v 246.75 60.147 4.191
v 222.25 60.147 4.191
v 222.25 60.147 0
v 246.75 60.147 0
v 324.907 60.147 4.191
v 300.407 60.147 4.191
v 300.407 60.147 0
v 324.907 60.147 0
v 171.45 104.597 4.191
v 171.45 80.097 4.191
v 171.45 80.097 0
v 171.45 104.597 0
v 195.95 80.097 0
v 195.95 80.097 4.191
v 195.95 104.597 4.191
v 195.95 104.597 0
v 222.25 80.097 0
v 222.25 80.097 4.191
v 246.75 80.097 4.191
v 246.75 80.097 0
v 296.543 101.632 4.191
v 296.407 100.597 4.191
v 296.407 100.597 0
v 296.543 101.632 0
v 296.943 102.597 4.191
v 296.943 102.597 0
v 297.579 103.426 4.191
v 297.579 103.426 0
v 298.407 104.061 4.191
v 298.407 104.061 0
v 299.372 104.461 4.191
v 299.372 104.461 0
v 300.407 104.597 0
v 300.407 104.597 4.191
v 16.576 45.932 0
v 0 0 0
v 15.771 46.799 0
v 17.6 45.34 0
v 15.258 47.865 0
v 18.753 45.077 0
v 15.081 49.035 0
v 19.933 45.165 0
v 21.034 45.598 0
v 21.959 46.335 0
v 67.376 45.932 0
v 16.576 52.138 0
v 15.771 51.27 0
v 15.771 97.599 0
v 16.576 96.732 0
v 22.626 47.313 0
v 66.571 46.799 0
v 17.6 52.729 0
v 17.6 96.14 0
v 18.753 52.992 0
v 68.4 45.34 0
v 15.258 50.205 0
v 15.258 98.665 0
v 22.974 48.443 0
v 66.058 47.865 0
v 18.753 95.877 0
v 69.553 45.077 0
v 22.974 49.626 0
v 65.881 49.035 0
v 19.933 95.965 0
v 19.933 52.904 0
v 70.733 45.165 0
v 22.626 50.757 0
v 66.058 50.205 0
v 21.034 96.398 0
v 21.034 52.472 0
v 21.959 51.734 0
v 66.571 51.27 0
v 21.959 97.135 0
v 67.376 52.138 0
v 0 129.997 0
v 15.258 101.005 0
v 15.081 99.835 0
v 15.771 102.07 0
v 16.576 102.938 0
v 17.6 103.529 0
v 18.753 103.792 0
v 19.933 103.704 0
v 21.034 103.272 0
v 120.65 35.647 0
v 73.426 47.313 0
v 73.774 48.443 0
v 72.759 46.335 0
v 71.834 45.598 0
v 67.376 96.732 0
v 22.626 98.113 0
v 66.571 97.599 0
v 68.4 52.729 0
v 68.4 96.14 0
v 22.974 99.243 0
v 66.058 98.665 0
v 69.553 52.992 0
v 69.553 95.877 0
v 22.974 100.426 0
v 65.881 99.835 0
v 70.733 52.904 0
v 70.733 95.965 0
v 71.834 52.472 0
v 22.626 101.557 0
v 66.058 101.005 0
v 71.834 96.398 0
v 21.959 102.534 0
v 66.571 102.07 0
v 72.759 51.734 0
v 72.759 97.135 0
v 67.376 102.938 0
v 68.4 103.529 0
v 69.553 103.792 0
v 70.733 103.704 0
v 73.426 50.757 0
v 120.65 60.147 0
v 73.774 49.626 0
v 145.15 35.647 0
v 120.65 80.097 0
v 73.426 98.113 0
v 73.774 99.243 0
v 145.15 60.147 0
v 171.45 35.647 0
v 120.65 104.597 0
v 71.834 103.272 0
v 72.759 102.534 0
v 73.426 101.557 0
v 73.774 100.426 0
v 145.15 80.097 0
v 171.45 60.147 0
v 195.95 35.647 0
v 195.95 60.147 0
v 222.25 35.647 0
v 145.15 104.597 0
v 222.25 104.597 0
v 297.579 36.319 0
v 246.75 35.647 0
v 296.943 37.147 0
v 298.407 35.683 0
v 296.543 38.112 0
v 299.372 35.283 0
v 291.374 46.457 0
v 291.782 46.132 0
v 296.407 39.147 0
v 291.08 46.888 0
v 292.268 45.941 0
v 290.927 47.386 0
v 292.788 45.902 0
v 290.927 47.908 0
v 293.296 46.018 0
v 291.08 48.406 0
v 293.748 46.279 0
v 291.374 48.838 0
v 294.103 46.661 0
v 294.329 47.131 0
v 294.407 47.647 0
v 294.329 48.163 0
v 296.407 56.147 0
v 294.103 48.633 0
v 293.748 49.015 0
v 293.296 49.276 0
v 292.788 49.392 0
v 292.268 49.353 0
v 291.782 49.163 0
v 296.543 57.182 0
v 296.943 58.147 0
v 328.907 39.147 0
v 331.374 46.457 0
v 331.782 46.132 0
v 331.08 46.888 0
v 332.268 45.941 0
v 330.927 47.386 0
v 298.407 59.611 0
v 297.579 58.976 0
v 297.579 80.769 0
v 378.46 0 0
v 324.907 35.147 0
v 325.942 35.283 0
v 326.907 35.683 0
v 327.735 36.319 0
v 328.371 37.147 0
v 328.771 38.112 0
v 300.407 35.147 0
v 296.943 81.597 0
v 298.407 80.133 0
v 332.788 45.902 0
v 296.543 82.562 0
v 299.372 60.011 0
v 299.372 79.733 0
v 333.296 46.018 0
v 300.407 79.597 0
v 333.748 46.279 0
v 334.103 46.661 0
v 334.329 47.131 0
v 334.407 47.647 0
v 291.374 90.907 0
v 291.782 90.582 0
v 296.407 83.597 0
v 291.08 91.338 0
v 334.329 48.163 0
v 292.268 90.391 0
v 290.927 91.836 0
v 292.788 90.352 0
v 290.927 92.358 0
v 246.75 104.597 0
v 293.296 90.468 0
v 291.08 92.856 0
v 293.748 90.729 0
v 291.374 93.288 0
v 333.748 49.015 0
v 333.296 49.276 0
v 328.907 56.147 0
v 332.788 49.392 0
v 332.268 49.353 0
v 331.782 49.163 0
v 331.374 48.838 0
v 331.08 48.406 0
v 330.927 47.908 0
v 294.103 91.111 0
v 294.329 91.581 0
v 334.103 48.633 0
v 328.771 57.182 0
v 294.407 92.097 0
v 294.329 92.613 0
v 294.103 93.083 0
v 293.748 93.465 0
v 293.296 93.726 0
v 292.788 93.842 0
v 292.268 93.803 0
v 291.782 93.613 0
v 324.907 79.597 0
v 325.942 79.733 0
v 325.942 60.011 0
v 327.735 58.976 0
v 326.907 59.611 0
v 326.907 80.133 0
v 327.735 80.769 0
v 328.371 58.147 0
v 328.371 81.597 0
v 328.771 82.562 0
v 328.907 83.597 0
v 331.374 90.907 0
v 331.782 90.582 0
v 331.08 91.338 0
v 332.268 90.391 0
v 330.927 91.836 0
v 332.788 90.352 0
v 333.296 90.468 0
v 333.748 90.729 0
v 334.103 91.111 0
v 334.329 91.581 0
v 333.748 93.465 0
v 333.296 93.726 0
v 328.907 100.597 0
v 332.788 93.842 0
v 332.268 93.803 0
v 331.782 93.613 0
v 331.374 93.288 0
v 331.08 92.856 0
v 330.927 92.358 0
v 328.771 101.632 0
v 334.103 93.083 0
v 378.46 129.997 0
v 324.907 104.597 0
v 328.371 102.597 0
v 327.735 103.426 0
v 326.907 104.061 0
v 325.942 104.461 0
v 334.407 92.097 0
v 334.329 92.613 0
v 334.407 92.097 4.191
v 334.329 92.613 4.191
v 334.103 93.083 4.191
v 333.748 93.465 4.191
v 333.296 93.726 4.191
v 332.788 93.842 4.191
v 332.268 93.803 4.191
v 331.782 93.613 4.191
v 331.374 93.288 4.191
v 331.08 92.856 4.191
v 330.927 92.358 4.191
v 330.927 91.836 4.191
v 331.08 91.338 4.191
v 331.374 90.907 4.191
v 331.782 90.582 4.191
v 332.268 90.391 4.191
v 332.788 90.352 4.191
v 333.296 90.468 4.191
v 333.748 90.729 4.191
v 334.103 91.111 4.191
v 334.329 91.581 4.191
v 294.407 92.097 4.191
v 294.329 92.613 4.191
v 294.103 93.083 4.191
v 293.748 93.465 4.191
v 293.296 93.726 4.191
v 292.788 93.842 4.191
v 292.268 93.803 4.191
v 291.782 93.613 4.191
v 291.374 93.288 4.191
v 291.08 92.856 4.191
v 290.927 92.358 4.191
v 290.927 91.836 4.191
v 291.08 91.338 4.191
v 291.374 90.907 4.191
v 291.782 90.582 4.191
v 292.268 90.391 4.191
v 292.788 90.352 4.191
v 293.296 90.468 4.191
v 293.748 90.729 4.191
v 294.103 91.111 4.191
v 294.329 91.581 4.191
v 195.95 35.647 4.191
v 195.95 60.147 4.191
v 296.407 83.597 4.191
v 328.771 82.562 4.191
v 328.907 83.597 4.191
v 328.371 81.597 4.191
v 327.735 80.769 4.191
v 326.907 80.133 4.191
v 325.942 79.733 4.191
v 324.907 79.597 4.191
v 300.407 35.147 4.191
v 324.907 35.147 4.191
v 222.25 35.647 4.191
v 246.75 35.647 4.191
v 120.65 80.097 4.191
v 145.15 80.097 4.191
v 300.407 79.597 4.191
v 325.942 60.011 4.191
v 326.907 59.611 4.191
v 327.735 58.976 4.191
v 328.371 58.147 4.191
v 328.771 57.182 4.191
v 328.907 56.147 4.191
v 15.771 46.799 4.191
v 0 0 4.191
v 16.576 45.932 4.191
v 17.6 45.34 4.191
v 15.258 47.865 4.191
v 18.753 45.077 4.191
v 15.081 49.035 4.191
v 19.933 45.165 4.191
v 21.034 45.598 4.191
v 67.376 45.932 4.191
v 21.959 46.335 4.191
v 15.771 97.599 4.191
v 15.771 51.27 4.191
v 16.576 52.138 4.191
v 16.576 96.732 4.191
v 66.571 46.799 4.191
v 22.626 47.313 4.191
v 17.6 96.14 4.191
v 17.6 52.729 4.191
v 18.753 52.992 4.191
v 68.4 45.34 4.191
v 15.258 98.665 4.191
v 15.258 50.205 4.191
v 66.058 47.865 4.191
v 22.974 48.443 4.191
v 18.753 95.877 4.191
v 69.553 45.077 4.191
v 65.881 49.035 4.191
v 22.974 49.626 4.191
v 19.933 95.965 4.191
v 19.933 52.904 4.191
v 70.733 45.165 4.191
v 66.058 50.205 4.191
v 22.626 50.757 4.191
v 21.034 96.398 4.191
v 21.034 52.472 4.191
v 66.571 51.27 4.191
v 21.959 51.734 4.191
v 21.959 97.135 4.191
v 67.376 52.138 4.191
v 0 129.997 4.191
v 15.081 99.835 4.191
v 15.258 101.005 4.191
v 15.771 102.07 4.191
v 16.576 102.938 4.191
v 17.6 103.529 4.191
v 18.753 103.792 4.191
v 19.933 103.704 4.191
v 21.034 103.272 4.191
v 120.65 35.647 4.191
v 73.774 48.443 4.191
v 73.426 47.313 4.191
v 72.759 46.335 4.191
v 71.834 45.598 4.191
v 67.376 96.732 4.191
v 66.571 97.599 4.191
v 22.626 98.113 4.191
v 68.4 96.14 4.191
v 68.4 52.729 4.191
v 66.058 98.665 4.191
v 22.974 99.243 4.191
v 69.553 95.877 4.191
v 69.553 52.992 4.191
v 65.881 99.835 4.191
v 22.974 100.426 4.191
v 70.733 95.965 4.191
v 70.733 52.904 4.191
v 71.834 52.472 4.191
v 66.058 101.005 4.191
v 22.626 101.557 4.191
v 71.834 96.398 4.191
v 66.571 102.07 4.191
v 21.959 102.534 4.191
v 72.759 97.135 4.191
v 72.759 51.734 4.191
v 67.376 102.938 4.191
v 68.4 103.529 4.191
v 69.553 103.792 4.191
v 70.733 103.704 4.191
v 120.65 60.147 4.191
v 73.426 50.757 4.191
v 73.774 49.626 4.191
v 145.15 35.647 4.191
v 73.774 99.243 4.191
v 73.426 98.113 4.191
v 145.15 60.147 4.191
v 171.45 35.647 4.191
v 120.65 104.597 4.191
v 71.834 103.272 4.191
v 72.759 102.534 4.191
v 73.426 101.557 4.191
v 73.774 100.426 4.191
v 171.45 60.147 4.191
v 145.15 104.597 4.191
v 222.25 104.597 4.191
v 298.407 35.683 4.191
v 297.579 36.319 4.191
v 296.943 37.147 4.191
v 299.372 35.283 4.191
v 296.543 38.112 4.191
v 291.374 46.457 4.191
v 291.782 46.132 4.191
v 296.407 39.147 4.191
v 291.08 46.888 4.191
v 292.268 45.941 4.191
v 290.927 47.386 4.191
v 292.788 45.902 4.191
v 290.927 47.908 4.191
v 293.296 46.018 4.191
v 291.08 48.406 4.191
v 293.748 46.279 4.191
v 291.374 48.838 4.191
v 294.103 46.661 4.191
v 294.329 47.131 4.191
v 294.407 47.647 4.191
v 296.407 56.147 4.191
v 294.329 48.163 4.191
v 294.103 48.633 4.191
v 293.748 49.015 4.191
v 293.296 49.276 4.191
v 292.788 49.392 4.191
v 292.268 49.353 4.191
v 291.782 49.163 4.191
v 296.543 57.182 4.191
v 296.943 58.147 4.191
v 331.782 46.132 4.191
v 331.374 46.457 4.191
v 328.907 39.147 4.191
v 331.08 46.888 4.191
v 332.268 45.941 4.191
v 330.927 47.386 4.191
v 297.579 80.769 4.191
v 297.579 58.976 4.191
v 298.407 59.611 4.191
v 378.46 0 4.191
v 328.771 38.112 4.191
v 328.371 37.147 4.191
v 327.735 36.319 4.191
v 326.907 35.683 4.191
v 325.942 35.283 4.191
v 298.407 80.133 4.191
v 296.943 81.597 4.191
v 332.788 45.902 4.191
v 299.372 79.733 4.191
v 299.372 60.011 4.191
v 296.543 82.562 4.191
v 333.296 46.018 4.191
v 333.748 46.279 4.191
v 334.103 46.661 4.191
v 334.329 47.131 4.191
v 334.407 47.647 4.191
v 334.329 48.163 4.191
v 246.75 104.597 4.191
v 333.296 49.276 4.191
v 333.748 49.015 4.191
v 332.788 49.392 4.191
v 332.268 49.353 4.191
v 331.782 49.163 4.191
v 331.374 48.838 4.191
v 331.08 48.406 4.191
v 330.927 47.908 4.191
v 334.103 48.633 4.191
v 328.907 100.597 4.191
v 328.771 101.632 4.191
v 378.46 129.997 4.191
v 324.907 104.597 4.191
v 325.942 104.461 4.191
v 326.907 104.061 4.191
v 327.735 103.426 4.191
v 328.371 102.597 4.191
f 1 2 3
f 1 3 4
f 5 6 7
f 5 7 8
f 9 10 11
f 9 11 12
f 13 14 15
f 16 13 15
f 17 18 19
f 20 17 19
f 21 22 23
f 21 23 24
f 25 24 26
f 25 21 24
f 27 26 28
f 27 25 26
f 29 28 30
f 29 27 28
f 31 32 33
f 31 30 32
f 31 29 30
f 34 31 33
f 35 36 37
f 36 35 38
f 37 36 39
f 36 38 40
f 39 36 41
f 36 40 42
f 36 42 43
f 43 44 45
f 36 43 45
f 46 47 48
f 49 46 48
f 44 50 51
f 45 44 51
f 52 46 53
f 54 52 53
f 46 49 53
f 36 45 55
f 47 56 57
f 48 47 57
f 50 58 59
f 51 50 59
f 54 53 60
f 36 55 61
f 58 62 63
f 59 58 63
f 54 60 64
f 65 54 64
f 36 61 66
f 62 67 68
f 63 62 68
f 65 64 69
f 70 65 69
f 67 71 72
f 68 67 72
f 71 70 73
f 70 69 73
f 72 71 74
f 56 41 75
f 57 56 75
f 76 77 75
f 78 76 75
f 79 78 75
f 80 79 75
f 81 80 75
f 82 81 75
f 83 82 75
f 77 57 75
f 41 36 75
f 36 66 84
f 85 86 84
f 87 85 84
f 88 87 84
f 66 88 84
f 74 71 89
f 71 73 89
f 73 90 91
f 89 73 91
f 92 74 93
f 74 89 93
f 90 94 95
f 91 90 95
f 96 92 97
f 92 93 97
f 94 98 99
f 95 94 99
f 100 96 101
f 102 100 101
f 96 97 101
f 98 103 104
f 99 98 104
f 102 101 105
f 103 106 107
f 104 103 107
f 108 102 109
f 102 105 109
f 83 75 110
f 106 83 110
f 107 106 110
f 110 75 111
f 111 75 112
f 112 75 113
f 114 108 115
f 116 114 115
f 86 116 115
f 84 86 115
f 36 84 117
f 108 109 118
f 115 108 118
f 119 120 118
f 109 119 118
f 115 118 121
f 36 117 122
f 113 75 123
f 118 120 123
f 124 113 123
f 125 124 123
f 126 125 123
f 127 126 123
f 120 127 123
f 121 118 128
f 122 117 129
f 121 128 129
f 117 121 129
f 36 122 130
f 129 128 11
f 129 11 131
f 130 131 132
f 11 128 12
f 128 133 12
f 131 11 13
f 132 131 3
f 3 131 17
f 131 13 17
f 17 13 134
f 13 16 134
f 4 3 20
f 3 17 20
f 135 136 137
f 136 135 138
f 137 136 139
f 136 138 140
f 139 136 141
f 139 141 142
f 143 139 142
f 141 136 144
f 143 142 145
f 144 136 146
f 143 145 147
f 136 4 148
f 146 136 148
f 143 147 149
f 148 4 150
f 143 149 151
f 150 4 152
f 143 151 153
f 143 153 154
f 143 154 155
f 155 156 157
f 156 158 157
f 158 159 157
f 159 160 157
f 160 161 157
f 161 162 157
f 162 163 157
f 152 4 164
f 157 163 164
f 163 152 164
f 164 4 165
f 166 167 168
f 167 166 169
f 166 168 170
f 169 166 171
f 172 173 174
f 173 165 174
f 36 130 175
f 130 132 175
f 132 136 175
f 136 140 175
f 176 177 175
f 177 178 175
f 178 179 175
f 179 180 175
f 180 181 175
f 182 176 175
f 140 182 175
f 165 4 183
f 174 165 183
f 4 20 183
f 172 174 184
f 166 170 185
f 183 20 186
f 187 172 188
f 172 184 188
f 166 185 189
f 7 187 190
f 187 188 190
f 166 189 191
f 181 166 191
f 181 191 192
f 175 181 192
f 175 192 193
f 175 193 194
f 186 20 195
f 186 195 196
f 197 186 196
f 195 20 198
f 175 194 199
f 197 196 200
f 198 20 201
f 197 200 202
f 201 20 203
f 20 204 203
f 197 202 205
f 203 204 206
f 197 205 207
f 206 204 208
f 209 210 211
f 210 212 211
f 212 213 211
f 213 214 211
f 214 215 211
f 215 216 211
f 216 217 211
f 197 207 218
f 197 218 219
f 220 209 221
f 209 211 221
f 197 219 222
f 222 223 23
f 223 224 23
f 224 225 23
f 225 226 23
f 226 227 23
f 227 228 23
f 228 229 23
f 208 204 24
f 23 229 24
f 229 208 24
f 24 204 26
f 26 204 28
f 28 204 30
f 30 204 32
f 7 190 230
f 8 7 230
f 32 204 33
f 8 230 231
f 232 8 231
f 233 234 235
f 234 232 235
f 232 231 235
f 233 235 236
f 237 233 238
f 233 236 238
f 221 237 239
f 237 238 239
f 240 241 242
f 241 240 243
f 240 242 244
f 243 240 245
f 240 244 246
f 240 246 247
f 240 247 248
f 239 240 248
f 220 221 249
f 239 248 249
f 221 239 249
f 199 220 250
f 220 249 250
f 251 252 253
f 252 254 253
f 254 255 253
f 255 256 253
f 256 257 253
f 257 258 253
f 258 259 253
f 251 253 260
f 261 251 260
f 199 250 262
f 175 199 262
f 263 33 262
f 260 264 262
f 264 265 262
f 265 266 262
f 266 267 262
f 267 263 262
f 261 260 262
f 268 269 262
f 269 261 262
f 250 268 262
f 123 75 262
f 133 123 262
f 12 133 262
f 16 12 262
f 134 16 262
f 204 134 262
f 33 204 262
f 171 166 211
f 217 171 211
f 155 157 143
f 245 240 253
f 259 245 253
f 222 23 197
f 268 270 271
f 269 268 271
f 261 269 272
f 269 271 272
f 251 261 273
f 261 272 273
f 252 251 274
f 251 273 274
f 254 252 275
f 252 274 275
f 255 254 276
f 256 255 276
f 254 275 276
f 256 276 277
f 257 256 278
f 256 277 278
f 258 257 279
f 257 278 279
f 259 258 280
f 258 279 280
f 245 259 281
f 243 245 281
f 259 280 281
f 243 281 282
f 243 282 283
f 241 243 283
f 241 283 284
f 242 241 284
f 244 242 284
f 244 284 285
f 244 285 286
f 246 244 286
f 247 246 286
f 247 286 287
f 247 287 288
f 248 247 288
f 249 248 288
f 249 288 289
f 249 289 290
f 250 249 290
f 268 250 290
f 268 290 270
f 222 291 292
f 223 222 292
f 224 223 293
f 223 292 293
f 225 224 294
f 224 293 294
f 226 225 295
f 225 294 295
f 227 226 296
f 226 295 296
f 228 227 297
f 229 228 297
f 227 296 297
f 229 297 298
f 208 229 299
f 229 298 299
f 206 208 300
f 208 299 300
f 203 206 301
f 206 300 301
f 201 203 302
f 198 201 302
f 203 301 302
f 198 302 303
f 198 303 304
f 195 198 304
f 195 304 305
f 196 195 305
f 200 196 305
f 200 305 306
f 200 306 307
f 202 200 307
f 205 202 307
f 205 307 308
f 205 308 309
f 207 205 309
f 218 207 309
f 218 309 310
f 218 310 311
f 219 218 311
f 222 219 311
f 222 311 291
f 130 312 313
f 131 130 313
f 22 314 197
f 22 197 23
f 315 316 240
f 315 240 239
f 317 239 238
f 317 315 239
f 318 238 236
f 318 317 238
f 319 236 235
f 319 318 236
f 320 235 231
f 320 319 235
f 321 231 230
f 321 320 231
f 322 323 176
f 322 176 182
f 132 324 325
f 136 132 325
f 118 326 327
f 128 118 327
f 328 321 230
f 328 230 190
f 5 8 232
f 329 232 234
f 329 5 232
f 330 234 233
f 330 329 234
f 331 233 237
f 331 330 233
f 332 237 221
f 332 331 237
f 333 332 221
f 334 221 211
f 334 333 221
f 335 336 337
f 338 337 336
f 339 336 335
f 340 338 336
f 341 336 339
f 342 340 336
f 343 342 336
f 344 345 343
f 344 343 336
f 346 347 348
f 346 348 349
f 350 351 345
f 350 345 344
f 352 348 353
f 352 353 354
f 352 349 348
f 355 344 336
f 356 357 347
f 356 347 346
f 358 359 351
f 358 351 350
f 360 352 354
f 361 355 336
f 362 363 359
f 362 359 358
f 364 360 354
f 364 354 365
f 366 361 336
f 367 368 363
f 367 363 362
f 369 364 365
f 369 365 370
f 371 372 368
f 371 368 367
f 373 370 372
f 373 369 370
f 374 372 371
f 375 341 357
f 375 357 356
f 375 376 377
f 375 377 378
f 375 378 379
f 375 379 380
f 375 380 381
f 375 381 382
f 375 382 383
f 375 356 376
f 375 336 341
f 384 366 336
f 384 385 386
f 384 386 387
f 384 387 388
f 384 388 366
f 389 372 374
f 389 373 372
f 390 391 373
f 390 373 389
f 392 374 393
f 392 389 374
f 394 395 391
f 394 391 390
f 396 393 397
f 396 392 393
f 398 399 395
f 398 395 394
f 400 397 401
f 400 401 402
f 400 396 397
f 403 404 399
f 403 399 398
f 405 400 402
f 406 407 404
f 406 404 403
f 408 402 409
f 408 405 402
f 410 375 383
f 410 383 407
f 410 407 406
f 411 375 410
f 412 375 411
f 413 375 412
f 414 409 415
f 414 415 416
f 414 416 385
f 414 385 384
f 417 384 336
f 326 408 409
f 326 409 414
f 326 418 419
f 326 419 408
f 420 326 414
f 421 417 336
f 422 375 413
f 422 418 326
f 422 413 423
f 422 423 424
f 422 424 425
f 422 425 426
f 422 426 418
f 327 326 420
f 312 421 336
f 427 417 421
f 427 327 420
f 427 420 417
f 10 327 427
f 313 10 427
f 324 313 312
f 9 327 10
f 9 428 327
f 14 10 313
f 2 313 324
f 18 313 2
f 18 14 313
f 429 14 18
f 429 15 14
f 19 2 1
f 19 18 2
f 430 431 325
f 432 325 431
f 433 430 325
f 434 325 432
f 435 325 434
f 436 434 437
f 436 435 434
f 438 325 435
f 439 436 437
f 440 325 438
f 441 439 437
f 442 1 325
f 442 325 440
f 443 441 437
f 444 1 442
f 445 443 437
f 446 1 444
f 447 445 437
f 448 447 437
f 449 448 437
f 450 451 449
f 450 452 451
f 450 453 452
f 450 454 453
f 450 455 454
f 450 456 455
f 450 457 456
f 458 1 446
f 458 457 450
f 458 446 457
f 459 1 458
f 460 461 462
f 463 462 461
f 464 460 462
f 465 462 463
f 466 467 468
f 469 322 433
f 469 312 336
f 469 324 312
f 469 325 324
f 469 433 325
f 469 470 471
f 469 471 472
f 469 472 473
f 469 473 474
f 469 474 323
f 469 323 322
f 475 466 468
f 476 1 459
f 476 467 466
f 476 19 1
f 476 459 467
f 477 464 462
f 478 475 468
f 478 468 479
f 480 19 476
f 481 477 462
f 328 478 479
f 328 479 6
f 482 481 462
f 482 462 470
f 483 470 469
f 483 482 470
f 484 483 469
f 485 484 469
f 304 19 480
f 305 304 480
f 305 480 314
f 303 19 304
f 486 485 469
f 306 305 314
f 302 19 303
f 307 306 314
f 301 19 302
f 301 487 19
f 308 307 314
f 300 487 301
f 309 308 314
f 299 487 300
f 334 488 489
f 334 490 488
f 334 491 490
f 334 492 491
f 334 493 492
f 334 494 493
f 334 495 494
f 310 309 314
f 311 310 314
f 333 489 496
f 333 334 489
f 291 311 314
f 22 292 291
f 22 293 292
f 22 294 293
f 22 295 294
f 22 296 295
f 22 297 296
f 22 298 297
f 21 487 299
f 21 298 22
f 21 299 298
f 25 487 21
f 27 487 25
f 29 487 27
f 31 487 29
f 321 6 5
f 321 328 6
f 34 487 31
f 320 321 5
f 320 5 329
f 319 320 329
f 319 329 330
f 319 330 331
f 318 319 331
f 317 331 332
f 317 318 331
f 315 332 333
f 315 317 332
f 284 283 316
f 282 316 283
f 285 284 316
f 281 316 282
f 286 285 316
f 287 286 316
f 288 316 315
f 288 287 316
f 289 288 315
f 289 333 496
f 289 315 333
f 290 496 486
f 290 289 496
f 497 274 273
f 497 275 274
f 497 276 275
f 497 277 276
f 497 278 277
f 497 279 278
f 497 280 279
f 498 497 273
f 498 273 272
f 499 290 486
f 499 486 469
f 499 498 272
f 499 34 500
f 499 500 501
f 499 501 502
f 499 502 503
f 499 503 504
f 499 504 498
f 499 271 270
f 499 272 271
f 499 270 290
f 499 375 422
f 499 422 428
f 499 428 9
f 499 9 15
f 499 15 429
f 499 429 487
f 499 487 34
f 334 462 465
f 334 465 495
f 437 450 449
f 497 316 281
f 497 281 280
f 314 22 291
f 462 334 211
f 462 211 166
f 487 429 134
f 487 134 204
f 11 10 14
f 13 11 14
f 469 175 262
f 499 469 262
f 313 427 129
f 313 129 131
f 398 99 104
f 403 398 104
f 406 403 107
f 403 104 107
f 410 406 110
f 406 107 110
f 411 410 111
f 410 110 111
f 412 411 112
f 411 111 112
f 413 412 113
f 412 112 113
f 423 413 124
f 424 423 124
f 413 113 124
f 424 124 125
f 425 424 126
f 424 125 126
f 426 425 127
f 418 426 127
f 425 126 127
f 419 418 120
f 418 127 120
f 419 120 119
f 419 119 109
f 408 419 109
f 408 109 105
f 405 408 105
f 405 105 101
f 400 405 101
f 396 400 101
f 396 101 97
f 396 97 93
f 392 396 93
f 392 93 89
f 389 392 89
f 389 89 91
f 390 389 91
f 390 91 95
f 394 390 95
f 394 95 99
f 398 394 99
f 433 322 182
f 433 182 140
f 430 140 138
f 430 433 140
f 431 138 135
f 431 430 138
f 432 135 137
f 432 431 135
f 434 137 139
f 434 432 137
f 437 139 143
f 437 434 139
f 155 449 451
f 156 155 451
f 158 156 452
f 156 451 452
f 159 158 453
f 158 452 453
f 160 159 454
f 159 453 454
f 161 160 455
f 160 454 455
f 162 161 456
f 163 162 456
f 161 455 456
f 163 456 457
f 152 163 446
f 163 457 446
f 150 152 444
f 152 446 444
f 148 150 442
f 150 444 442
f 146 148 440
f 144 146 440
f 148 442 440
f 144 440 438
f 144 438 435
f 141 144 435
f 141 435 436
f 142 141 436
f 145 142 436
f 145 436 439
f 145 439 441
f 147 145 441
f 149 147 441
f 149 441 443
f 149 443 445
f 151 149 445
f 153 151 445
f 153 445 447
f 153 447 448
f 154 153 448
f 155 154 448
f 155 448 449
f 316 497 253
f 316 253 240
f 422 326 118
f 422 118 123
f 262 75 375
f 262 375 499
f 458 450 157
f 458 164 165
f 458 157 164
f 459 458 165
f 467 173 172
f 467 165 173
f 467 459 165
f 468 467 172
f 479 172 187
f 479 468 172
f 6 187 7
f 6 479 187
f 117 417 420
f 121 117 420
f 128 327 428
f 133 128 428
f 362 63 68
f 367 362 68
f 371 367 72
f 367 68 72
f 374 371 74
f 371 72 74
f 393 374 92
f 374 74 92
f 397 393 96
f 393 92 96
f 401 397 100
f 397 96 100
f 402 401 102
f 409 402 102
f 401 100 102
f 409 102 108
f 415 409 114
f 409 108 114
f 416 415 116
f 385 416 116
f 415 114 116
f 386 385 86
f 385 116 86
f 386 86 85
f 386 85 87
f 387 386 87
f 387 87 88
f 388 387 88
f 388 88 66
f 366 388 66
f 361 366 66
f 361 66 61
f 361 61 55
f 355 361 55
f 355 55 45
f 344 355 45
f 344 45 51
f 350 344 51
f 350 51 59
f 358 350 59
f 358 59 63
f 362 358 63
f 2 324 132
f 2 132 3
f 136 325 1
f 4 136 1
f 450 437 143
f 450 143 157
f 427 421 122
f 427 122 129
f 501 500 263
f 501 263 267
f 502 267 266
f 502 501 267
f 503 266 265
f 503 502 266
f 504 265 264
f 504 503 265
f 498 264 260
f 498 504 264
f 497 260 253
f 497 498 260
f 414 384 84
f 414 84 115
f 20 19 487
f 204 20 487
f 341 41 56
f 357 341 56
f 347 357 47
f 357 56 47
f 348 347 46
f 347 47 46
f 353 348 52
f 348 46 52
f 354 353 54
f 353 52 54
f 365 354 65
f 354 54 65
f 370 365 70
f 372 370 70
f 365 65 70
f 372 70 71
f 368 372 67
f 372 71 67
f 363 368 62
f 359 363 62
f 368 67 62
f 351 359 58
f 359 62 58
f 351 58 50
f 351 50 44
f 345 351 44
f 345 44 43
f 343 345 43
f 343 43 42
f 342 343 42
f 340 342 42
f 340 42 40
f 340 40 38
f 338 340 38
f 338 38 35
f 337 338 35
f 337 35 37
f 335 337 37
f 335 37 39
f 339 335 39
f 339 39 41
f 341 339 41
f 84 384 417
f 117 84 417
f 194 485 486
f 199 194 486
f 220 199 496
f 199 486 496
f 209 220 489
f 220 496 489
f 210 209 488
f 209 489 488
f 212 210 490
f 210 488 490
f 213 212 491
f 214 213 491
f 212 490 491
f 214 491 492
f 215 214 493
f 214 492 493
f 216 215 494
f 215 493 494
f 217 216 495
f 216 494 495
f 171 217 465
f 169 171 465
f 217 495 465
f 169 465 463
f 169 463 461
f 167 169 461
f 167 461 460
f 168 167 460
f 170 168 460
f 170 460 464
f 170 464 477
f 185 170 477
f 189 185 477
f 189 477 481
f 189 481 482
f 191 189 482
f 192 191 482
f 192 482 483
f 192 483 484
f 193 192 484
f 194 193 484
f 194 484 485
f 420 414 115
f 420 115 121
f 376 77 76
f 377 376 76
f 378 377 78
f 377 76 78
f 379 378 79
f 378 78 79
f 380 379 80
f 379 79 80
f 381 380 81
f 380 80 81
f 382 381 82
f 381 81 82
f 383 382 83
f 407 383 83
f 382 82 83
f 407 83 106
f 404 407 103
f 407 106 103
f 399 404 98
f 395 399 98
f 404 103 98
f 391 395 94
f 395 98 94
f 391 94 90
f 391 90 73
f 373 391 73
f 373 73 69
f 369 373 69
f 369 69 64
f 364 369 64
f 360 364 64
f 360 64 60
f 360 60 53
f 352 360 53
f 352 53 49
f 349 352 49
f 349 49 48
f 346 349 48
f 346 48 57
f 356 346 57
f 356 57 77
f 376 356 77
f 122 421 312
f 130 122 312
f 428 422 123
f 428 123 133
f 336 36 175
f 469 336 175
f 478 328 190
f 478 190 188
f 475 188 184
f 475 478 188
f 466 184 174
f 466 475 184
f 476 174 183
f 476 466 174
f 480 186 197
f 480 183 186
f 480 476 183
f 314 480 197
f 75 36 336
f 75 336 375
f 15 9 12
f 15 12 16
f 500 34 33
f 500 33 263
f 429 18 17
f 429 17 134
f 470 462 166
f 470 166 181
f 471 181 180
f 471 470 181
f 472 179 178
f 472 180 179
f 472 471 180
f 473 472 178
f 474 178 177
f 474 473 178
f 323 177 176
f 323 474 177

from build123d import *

# Parameters (mm, degrees)
SKETCH1_W               = 378.46
SKETCH1_H               = 129.9972
BOSS_EXTRUDE1_DEPTH     = 4.191
F_3_8_16_TAPPED_HOLE1_D = 7.9375
CUT_EXTRUDE1_REACH      = 402.186
SKETCH5_W               = 24.5
SKETCH5_H               = 24.5
CUT_EXTRUDE2_REACH      = 402.186
SKETCH7_R               = 1.75


with BuildPart() as part:
    # Sketch1 → Boss-Extrude1 (new body)
    with BuildSketch(Plane.XY):
        with Locations((189.23, 64.9986)):
            Rectangle(SKETCH1_W, SKETCH1_H)
    extrude(amount=BOSS_EXTRUDE1_DEPTH)

    # 3/8-16 Tapped Hole1 (through all)
    with Locations(Plane.XY.offset(4.191)):
        with Locations((19.05, 99.8347), (69.85, 99.8347), (69.85, 49.0347), (19.05, 49.0347)):
            Hole(F_3_8_16_TAPPED_HOLE1_D / 2)

    # Sketch5 → Cut-Extrude1 (cut, up to next)
    with BuildSketch(Plane.XY.offset(4.191), mode=Mode.PRIVATE) as cut_extrude1_sk1:
        with Locations((132.9, 92.3472)):
            Rectangle(SKETCH5_W, SKETCH5_H)
    cut_extrude1_tool1 = extrude(cut_extrude1_sk1.sketch, amount=-CUT_EXTRUDE1_REACH, mode=Mode.PRIVATE) & part.part
    # Sketch5 → Cut-Extrude1 (cut, up to next)
    with BuildSketch(Plane.XY.offset(4.191), mode=Mode.PRIVATE) as cut_extrude1_sk2:
        with Locations((183.7, 92.3472)):
            Rectangle(SKETCH5_W, SKETCH5_H)
    cut_extrude1_tool2 = extrude(cut_extrude1_sk2.sketch, amount=-CUT_EXTRUDE1_REACH, mode=Mode.PRIVATE) & part.part
    # Sketch5 → Cut-Extrude1 (cut, up to next)
    with BuildSketch(Plane.XY.offset(4.191), mode=Mode.PRIVATE) as cut_extrude1_sk3:
        with Locations((234.5, 92.3472)):
            Rectangle(SKETCH5_W, SKETCH5_H)
    cut_extrude1_tool3 = extrude(cut_extrude1_sk3.sketch, amount=-CUT_EXTRUDE1_REACH, mode=Mode.PRIVATE) & part.part
    # Sketch5 → Cut-Extrude1 (cut, up to next)
    with BuildSketch(Plane.XY.offset(4.191), mode=Mode.PRIVATE) as cut_extrude1_sk4:
        with Locations((183.7, 47.8972)):
            Rectangle(SKETCH5_W, SKETCH5_H)
    cut_extrude1_tool4 = extrude(cut_extrude1_sk4.sketch, amount=-CUT_EXTRUDE1_REACH, mode=Mode.PRIVATE) & part.part
    # Sketch5 → Cut-Extrude1 (cut, up to next)
    with BuildSketch(Plane.XY.offset(4.191), mode=Mode.PRIVATE) as cut_extrude1_sk5:
        with Locations((234.5, 47.8972)):
            Rectangle(SKETCH5_W, SKETCH5_H)
    cut_extrude1_tool5 = extrude(cut_extrude1_sk5.sketch, amount=-CUT_EXTRUDE1_REACH, mode=Mode.PRIVATE) & part.part
    # Sketch5 → Cut-Extrude1 (cut, up to next)
    with BuildSketch(Plane.XY.offset(4.191), mode=Mode.PRIVATE) as cut_extrude1_sk6:
        with Locations((132.9, 47.8972)):
            Rectangle(SKETCH5_W, SKETCH5_H)
    cut_extrude1_tool6 = extrude(cut_extrude1_sk6.sketch, amount=-CUT_EXTRUDE1_REACH, mode=Mode.PRIVATE) & part.part
    add(cut_extrude1_tool1.solids().sort_by_distance((132.9, 92.3472, 4.191))[0], mode=Mode.SUBTRACT)
    add(cut_extrude1_tool2.solids().sort_by_distance((183.7, 92.3472, 4.191))[0], mode=Mode.SUBTRACT)
    add(cut_extrude1_tool3.solids().sort_by_distance((234.5, 92.3472, 4.191))[0], mode=Mode.SUBTRACT)
    add(cut_extrude1_tool4.solids().sort_by_distance((183.7, 47.8972, 4.191))[0], mode=Mode.SUBTRACT)
    add(cut_extrude1_tool5.solids().sort_by_distance((234.5, 47.8972, 4.191))[0], mode=Mode.SUBTRACT)
    add(cut_extrude1_tool6.solids().sort_by_distance((132.9, 47.8972, 4.191))[0], mode=Mode.SUBTRACT)

    # Sketch7 → Cut-Extrude2 (cut, up to next)
    with BuildSketch(Plane.XY.offset(4.191), mode=Mode.PRIVATE) as cut_extrude2_sk1:
        with Locations((292.657, 92.0972)):
            Circle(SKETCH7_R)
    cut_extrude2_tool1 = extrude(cut_extrude2_sk1.sketch, amount=-CUT_EXTRUDE2_REACH, mode=Mode.PRIVATE) & part.part
    # Sketch7 → Cut-Extrude2 (cut, up to next)
    with BuildSketch(Plane.XY.offset(4.191), mode=Mode.PRIVATE) as cut_extrude2_sk2:
        with Locations((332.657, 92.0972)):
            Circle(SKETCH7_R)
    cut_extrude2_tool2 = extrude(cut_extrude2_sk2.sketch, amount=-CUT_EXTRUDE2_REACH, mode=Mode.PRIVATE) & part.part
    # Sketch7 → Cut-Extrude2 (cut, up to next)
    with BuildSketch(Plane.XY.offset(4.191), mode=Mode.PRIVATE) as cut_extrude2_sk3:
        with Locations((332.657, 47.6472)):
            Circle(SKETCH7_R)
    cut_extrude2_tool3 = extrude(cut_extrude2_sk3.sketch, amount=-CUT_EXTRUDE2_REACH, mode=Mode.PRIVATE) & part.part
    # Sketch7 → Cut-Extrude2 (cut, up to next)
    with BuildSketch(Plane.XY.offset(4.191), mode=Mode.PRIVATE) as cut_extrude2_sk4:
        with Locations((292.657, 47.6472)):
            Circle(SKETCH7_R)
    cut_extrude2_tool4 = extrude(cut_extrude2_sk4.sketch, amount=-CUT_EXTRUDE2_REACH, mode=Mode.PRIVATE) & part.part
    # Sketch7 → Cut-Extrude2 (cut, up to next)
    with BuildSketch(Plane.XY.offset(4.191), mode=Mode.PRIVATE) as cut_extrude2_sk5:
        with BuildLine():
            Line((300.407, 60.1472), (324.907, 60.1472))
            ThreePointArc((324.907, 60.1472), (327.735427125, 58.975627125), (328.907, 56.1472))
            Line((328.907, 56.1472), (328.907, 39.1472))
            ThreePointArc((328.907, 39.1472), (327.735427125, 36.318772875), (324.907, 35.1472))
            Line((324.907, 35.1472), (300.407, 35.1472))
            ThreePointArc((300.407, 35.1472), (297.578572875, 36.318772875), (296.407, 39.1472))
            Line((296.407, 39.1472), (296.407, 56.1472))
            ThreePointArc((296.407, 56.1472), (297.578572875, 58.975627125), (300.407, 60.1472))
        make_face()
    cut_extrude2_tool5 = extrude(cut_extrude2_sk5.sketch, amount=-CUT_EXTRUDE2_REACH, mode=Mode.PRIVATE) & part.part
    # Sketch7 → Cut-Extrude2 (cut, up to next)
    with BuildSketch(Plane.XY.offset(4.191), mode=Mode.PRIVATE) as cut_extrude2_sk6:
        with BuildLine():
            Line((300.407, 104.5972), (324.907, 104.5972))
            ThreePointArc((324.907, 104.5972), (327.735427125, 103.425627125), (328.907, 100.5972))
            Line((328.907, 100.5972), (328.907, 83.5972))
            ThreePointArc((328.907, 83.5972), (327.735427125, 80.768772875), (324.907, 79.5972))
            Line((324.907, 79.5972), (300.407, 79.5972))
            ThreePointArc((300.407, 79.5972), (297.578572875, 80.768772875), (296.407, 83.5972))
            Line((296.407, 83.5972), (296.407, 100.5972))
            ThreePointArc((296.407, 100.5972), (297.578572875, 103.425627125), (300.407, 104.5972))
        make_face()
    cut_extrude2_tool6 = extrude(cut_extrude2_sk6.sketch, amount=-CUT_EXTRUDE2_REACH, mode=Mode.PRIVATE) & part.part
    add(cut_extrude2_tool1.solids().sort_by_distance((292.657, 92.0972, 4.191))[0], mode=Mode.SUBTRACT)
    add(cut_extrude2_tool2.solids().sort_by_distance((332.657, 92.0972, 4.191))[0], mode=Mode.SUBTRACT)
    add(cut_extrude2_tool3.solids().sort_by_distance((332.657, 47.6472, 4.191))[0], mode=Mode.SUBTRACT)
    add(cut_extrude2_tool4.solids().sort_by_distance((292.657, 47.6472, 4.191))[0], mode=Mode.SUBTRACT)
    add(cut_extrude2_tool5.solids().sort_by_distance((312.657, 47.6472, 4.191))[0], mode=Mode.SUBTRACT)
    add(cut_extrude2_tool6.solids().sort_by_distance((312.657, 92.0972, 4.191))[0], mode=Mode.SUBTRACT)


solid = part.part
